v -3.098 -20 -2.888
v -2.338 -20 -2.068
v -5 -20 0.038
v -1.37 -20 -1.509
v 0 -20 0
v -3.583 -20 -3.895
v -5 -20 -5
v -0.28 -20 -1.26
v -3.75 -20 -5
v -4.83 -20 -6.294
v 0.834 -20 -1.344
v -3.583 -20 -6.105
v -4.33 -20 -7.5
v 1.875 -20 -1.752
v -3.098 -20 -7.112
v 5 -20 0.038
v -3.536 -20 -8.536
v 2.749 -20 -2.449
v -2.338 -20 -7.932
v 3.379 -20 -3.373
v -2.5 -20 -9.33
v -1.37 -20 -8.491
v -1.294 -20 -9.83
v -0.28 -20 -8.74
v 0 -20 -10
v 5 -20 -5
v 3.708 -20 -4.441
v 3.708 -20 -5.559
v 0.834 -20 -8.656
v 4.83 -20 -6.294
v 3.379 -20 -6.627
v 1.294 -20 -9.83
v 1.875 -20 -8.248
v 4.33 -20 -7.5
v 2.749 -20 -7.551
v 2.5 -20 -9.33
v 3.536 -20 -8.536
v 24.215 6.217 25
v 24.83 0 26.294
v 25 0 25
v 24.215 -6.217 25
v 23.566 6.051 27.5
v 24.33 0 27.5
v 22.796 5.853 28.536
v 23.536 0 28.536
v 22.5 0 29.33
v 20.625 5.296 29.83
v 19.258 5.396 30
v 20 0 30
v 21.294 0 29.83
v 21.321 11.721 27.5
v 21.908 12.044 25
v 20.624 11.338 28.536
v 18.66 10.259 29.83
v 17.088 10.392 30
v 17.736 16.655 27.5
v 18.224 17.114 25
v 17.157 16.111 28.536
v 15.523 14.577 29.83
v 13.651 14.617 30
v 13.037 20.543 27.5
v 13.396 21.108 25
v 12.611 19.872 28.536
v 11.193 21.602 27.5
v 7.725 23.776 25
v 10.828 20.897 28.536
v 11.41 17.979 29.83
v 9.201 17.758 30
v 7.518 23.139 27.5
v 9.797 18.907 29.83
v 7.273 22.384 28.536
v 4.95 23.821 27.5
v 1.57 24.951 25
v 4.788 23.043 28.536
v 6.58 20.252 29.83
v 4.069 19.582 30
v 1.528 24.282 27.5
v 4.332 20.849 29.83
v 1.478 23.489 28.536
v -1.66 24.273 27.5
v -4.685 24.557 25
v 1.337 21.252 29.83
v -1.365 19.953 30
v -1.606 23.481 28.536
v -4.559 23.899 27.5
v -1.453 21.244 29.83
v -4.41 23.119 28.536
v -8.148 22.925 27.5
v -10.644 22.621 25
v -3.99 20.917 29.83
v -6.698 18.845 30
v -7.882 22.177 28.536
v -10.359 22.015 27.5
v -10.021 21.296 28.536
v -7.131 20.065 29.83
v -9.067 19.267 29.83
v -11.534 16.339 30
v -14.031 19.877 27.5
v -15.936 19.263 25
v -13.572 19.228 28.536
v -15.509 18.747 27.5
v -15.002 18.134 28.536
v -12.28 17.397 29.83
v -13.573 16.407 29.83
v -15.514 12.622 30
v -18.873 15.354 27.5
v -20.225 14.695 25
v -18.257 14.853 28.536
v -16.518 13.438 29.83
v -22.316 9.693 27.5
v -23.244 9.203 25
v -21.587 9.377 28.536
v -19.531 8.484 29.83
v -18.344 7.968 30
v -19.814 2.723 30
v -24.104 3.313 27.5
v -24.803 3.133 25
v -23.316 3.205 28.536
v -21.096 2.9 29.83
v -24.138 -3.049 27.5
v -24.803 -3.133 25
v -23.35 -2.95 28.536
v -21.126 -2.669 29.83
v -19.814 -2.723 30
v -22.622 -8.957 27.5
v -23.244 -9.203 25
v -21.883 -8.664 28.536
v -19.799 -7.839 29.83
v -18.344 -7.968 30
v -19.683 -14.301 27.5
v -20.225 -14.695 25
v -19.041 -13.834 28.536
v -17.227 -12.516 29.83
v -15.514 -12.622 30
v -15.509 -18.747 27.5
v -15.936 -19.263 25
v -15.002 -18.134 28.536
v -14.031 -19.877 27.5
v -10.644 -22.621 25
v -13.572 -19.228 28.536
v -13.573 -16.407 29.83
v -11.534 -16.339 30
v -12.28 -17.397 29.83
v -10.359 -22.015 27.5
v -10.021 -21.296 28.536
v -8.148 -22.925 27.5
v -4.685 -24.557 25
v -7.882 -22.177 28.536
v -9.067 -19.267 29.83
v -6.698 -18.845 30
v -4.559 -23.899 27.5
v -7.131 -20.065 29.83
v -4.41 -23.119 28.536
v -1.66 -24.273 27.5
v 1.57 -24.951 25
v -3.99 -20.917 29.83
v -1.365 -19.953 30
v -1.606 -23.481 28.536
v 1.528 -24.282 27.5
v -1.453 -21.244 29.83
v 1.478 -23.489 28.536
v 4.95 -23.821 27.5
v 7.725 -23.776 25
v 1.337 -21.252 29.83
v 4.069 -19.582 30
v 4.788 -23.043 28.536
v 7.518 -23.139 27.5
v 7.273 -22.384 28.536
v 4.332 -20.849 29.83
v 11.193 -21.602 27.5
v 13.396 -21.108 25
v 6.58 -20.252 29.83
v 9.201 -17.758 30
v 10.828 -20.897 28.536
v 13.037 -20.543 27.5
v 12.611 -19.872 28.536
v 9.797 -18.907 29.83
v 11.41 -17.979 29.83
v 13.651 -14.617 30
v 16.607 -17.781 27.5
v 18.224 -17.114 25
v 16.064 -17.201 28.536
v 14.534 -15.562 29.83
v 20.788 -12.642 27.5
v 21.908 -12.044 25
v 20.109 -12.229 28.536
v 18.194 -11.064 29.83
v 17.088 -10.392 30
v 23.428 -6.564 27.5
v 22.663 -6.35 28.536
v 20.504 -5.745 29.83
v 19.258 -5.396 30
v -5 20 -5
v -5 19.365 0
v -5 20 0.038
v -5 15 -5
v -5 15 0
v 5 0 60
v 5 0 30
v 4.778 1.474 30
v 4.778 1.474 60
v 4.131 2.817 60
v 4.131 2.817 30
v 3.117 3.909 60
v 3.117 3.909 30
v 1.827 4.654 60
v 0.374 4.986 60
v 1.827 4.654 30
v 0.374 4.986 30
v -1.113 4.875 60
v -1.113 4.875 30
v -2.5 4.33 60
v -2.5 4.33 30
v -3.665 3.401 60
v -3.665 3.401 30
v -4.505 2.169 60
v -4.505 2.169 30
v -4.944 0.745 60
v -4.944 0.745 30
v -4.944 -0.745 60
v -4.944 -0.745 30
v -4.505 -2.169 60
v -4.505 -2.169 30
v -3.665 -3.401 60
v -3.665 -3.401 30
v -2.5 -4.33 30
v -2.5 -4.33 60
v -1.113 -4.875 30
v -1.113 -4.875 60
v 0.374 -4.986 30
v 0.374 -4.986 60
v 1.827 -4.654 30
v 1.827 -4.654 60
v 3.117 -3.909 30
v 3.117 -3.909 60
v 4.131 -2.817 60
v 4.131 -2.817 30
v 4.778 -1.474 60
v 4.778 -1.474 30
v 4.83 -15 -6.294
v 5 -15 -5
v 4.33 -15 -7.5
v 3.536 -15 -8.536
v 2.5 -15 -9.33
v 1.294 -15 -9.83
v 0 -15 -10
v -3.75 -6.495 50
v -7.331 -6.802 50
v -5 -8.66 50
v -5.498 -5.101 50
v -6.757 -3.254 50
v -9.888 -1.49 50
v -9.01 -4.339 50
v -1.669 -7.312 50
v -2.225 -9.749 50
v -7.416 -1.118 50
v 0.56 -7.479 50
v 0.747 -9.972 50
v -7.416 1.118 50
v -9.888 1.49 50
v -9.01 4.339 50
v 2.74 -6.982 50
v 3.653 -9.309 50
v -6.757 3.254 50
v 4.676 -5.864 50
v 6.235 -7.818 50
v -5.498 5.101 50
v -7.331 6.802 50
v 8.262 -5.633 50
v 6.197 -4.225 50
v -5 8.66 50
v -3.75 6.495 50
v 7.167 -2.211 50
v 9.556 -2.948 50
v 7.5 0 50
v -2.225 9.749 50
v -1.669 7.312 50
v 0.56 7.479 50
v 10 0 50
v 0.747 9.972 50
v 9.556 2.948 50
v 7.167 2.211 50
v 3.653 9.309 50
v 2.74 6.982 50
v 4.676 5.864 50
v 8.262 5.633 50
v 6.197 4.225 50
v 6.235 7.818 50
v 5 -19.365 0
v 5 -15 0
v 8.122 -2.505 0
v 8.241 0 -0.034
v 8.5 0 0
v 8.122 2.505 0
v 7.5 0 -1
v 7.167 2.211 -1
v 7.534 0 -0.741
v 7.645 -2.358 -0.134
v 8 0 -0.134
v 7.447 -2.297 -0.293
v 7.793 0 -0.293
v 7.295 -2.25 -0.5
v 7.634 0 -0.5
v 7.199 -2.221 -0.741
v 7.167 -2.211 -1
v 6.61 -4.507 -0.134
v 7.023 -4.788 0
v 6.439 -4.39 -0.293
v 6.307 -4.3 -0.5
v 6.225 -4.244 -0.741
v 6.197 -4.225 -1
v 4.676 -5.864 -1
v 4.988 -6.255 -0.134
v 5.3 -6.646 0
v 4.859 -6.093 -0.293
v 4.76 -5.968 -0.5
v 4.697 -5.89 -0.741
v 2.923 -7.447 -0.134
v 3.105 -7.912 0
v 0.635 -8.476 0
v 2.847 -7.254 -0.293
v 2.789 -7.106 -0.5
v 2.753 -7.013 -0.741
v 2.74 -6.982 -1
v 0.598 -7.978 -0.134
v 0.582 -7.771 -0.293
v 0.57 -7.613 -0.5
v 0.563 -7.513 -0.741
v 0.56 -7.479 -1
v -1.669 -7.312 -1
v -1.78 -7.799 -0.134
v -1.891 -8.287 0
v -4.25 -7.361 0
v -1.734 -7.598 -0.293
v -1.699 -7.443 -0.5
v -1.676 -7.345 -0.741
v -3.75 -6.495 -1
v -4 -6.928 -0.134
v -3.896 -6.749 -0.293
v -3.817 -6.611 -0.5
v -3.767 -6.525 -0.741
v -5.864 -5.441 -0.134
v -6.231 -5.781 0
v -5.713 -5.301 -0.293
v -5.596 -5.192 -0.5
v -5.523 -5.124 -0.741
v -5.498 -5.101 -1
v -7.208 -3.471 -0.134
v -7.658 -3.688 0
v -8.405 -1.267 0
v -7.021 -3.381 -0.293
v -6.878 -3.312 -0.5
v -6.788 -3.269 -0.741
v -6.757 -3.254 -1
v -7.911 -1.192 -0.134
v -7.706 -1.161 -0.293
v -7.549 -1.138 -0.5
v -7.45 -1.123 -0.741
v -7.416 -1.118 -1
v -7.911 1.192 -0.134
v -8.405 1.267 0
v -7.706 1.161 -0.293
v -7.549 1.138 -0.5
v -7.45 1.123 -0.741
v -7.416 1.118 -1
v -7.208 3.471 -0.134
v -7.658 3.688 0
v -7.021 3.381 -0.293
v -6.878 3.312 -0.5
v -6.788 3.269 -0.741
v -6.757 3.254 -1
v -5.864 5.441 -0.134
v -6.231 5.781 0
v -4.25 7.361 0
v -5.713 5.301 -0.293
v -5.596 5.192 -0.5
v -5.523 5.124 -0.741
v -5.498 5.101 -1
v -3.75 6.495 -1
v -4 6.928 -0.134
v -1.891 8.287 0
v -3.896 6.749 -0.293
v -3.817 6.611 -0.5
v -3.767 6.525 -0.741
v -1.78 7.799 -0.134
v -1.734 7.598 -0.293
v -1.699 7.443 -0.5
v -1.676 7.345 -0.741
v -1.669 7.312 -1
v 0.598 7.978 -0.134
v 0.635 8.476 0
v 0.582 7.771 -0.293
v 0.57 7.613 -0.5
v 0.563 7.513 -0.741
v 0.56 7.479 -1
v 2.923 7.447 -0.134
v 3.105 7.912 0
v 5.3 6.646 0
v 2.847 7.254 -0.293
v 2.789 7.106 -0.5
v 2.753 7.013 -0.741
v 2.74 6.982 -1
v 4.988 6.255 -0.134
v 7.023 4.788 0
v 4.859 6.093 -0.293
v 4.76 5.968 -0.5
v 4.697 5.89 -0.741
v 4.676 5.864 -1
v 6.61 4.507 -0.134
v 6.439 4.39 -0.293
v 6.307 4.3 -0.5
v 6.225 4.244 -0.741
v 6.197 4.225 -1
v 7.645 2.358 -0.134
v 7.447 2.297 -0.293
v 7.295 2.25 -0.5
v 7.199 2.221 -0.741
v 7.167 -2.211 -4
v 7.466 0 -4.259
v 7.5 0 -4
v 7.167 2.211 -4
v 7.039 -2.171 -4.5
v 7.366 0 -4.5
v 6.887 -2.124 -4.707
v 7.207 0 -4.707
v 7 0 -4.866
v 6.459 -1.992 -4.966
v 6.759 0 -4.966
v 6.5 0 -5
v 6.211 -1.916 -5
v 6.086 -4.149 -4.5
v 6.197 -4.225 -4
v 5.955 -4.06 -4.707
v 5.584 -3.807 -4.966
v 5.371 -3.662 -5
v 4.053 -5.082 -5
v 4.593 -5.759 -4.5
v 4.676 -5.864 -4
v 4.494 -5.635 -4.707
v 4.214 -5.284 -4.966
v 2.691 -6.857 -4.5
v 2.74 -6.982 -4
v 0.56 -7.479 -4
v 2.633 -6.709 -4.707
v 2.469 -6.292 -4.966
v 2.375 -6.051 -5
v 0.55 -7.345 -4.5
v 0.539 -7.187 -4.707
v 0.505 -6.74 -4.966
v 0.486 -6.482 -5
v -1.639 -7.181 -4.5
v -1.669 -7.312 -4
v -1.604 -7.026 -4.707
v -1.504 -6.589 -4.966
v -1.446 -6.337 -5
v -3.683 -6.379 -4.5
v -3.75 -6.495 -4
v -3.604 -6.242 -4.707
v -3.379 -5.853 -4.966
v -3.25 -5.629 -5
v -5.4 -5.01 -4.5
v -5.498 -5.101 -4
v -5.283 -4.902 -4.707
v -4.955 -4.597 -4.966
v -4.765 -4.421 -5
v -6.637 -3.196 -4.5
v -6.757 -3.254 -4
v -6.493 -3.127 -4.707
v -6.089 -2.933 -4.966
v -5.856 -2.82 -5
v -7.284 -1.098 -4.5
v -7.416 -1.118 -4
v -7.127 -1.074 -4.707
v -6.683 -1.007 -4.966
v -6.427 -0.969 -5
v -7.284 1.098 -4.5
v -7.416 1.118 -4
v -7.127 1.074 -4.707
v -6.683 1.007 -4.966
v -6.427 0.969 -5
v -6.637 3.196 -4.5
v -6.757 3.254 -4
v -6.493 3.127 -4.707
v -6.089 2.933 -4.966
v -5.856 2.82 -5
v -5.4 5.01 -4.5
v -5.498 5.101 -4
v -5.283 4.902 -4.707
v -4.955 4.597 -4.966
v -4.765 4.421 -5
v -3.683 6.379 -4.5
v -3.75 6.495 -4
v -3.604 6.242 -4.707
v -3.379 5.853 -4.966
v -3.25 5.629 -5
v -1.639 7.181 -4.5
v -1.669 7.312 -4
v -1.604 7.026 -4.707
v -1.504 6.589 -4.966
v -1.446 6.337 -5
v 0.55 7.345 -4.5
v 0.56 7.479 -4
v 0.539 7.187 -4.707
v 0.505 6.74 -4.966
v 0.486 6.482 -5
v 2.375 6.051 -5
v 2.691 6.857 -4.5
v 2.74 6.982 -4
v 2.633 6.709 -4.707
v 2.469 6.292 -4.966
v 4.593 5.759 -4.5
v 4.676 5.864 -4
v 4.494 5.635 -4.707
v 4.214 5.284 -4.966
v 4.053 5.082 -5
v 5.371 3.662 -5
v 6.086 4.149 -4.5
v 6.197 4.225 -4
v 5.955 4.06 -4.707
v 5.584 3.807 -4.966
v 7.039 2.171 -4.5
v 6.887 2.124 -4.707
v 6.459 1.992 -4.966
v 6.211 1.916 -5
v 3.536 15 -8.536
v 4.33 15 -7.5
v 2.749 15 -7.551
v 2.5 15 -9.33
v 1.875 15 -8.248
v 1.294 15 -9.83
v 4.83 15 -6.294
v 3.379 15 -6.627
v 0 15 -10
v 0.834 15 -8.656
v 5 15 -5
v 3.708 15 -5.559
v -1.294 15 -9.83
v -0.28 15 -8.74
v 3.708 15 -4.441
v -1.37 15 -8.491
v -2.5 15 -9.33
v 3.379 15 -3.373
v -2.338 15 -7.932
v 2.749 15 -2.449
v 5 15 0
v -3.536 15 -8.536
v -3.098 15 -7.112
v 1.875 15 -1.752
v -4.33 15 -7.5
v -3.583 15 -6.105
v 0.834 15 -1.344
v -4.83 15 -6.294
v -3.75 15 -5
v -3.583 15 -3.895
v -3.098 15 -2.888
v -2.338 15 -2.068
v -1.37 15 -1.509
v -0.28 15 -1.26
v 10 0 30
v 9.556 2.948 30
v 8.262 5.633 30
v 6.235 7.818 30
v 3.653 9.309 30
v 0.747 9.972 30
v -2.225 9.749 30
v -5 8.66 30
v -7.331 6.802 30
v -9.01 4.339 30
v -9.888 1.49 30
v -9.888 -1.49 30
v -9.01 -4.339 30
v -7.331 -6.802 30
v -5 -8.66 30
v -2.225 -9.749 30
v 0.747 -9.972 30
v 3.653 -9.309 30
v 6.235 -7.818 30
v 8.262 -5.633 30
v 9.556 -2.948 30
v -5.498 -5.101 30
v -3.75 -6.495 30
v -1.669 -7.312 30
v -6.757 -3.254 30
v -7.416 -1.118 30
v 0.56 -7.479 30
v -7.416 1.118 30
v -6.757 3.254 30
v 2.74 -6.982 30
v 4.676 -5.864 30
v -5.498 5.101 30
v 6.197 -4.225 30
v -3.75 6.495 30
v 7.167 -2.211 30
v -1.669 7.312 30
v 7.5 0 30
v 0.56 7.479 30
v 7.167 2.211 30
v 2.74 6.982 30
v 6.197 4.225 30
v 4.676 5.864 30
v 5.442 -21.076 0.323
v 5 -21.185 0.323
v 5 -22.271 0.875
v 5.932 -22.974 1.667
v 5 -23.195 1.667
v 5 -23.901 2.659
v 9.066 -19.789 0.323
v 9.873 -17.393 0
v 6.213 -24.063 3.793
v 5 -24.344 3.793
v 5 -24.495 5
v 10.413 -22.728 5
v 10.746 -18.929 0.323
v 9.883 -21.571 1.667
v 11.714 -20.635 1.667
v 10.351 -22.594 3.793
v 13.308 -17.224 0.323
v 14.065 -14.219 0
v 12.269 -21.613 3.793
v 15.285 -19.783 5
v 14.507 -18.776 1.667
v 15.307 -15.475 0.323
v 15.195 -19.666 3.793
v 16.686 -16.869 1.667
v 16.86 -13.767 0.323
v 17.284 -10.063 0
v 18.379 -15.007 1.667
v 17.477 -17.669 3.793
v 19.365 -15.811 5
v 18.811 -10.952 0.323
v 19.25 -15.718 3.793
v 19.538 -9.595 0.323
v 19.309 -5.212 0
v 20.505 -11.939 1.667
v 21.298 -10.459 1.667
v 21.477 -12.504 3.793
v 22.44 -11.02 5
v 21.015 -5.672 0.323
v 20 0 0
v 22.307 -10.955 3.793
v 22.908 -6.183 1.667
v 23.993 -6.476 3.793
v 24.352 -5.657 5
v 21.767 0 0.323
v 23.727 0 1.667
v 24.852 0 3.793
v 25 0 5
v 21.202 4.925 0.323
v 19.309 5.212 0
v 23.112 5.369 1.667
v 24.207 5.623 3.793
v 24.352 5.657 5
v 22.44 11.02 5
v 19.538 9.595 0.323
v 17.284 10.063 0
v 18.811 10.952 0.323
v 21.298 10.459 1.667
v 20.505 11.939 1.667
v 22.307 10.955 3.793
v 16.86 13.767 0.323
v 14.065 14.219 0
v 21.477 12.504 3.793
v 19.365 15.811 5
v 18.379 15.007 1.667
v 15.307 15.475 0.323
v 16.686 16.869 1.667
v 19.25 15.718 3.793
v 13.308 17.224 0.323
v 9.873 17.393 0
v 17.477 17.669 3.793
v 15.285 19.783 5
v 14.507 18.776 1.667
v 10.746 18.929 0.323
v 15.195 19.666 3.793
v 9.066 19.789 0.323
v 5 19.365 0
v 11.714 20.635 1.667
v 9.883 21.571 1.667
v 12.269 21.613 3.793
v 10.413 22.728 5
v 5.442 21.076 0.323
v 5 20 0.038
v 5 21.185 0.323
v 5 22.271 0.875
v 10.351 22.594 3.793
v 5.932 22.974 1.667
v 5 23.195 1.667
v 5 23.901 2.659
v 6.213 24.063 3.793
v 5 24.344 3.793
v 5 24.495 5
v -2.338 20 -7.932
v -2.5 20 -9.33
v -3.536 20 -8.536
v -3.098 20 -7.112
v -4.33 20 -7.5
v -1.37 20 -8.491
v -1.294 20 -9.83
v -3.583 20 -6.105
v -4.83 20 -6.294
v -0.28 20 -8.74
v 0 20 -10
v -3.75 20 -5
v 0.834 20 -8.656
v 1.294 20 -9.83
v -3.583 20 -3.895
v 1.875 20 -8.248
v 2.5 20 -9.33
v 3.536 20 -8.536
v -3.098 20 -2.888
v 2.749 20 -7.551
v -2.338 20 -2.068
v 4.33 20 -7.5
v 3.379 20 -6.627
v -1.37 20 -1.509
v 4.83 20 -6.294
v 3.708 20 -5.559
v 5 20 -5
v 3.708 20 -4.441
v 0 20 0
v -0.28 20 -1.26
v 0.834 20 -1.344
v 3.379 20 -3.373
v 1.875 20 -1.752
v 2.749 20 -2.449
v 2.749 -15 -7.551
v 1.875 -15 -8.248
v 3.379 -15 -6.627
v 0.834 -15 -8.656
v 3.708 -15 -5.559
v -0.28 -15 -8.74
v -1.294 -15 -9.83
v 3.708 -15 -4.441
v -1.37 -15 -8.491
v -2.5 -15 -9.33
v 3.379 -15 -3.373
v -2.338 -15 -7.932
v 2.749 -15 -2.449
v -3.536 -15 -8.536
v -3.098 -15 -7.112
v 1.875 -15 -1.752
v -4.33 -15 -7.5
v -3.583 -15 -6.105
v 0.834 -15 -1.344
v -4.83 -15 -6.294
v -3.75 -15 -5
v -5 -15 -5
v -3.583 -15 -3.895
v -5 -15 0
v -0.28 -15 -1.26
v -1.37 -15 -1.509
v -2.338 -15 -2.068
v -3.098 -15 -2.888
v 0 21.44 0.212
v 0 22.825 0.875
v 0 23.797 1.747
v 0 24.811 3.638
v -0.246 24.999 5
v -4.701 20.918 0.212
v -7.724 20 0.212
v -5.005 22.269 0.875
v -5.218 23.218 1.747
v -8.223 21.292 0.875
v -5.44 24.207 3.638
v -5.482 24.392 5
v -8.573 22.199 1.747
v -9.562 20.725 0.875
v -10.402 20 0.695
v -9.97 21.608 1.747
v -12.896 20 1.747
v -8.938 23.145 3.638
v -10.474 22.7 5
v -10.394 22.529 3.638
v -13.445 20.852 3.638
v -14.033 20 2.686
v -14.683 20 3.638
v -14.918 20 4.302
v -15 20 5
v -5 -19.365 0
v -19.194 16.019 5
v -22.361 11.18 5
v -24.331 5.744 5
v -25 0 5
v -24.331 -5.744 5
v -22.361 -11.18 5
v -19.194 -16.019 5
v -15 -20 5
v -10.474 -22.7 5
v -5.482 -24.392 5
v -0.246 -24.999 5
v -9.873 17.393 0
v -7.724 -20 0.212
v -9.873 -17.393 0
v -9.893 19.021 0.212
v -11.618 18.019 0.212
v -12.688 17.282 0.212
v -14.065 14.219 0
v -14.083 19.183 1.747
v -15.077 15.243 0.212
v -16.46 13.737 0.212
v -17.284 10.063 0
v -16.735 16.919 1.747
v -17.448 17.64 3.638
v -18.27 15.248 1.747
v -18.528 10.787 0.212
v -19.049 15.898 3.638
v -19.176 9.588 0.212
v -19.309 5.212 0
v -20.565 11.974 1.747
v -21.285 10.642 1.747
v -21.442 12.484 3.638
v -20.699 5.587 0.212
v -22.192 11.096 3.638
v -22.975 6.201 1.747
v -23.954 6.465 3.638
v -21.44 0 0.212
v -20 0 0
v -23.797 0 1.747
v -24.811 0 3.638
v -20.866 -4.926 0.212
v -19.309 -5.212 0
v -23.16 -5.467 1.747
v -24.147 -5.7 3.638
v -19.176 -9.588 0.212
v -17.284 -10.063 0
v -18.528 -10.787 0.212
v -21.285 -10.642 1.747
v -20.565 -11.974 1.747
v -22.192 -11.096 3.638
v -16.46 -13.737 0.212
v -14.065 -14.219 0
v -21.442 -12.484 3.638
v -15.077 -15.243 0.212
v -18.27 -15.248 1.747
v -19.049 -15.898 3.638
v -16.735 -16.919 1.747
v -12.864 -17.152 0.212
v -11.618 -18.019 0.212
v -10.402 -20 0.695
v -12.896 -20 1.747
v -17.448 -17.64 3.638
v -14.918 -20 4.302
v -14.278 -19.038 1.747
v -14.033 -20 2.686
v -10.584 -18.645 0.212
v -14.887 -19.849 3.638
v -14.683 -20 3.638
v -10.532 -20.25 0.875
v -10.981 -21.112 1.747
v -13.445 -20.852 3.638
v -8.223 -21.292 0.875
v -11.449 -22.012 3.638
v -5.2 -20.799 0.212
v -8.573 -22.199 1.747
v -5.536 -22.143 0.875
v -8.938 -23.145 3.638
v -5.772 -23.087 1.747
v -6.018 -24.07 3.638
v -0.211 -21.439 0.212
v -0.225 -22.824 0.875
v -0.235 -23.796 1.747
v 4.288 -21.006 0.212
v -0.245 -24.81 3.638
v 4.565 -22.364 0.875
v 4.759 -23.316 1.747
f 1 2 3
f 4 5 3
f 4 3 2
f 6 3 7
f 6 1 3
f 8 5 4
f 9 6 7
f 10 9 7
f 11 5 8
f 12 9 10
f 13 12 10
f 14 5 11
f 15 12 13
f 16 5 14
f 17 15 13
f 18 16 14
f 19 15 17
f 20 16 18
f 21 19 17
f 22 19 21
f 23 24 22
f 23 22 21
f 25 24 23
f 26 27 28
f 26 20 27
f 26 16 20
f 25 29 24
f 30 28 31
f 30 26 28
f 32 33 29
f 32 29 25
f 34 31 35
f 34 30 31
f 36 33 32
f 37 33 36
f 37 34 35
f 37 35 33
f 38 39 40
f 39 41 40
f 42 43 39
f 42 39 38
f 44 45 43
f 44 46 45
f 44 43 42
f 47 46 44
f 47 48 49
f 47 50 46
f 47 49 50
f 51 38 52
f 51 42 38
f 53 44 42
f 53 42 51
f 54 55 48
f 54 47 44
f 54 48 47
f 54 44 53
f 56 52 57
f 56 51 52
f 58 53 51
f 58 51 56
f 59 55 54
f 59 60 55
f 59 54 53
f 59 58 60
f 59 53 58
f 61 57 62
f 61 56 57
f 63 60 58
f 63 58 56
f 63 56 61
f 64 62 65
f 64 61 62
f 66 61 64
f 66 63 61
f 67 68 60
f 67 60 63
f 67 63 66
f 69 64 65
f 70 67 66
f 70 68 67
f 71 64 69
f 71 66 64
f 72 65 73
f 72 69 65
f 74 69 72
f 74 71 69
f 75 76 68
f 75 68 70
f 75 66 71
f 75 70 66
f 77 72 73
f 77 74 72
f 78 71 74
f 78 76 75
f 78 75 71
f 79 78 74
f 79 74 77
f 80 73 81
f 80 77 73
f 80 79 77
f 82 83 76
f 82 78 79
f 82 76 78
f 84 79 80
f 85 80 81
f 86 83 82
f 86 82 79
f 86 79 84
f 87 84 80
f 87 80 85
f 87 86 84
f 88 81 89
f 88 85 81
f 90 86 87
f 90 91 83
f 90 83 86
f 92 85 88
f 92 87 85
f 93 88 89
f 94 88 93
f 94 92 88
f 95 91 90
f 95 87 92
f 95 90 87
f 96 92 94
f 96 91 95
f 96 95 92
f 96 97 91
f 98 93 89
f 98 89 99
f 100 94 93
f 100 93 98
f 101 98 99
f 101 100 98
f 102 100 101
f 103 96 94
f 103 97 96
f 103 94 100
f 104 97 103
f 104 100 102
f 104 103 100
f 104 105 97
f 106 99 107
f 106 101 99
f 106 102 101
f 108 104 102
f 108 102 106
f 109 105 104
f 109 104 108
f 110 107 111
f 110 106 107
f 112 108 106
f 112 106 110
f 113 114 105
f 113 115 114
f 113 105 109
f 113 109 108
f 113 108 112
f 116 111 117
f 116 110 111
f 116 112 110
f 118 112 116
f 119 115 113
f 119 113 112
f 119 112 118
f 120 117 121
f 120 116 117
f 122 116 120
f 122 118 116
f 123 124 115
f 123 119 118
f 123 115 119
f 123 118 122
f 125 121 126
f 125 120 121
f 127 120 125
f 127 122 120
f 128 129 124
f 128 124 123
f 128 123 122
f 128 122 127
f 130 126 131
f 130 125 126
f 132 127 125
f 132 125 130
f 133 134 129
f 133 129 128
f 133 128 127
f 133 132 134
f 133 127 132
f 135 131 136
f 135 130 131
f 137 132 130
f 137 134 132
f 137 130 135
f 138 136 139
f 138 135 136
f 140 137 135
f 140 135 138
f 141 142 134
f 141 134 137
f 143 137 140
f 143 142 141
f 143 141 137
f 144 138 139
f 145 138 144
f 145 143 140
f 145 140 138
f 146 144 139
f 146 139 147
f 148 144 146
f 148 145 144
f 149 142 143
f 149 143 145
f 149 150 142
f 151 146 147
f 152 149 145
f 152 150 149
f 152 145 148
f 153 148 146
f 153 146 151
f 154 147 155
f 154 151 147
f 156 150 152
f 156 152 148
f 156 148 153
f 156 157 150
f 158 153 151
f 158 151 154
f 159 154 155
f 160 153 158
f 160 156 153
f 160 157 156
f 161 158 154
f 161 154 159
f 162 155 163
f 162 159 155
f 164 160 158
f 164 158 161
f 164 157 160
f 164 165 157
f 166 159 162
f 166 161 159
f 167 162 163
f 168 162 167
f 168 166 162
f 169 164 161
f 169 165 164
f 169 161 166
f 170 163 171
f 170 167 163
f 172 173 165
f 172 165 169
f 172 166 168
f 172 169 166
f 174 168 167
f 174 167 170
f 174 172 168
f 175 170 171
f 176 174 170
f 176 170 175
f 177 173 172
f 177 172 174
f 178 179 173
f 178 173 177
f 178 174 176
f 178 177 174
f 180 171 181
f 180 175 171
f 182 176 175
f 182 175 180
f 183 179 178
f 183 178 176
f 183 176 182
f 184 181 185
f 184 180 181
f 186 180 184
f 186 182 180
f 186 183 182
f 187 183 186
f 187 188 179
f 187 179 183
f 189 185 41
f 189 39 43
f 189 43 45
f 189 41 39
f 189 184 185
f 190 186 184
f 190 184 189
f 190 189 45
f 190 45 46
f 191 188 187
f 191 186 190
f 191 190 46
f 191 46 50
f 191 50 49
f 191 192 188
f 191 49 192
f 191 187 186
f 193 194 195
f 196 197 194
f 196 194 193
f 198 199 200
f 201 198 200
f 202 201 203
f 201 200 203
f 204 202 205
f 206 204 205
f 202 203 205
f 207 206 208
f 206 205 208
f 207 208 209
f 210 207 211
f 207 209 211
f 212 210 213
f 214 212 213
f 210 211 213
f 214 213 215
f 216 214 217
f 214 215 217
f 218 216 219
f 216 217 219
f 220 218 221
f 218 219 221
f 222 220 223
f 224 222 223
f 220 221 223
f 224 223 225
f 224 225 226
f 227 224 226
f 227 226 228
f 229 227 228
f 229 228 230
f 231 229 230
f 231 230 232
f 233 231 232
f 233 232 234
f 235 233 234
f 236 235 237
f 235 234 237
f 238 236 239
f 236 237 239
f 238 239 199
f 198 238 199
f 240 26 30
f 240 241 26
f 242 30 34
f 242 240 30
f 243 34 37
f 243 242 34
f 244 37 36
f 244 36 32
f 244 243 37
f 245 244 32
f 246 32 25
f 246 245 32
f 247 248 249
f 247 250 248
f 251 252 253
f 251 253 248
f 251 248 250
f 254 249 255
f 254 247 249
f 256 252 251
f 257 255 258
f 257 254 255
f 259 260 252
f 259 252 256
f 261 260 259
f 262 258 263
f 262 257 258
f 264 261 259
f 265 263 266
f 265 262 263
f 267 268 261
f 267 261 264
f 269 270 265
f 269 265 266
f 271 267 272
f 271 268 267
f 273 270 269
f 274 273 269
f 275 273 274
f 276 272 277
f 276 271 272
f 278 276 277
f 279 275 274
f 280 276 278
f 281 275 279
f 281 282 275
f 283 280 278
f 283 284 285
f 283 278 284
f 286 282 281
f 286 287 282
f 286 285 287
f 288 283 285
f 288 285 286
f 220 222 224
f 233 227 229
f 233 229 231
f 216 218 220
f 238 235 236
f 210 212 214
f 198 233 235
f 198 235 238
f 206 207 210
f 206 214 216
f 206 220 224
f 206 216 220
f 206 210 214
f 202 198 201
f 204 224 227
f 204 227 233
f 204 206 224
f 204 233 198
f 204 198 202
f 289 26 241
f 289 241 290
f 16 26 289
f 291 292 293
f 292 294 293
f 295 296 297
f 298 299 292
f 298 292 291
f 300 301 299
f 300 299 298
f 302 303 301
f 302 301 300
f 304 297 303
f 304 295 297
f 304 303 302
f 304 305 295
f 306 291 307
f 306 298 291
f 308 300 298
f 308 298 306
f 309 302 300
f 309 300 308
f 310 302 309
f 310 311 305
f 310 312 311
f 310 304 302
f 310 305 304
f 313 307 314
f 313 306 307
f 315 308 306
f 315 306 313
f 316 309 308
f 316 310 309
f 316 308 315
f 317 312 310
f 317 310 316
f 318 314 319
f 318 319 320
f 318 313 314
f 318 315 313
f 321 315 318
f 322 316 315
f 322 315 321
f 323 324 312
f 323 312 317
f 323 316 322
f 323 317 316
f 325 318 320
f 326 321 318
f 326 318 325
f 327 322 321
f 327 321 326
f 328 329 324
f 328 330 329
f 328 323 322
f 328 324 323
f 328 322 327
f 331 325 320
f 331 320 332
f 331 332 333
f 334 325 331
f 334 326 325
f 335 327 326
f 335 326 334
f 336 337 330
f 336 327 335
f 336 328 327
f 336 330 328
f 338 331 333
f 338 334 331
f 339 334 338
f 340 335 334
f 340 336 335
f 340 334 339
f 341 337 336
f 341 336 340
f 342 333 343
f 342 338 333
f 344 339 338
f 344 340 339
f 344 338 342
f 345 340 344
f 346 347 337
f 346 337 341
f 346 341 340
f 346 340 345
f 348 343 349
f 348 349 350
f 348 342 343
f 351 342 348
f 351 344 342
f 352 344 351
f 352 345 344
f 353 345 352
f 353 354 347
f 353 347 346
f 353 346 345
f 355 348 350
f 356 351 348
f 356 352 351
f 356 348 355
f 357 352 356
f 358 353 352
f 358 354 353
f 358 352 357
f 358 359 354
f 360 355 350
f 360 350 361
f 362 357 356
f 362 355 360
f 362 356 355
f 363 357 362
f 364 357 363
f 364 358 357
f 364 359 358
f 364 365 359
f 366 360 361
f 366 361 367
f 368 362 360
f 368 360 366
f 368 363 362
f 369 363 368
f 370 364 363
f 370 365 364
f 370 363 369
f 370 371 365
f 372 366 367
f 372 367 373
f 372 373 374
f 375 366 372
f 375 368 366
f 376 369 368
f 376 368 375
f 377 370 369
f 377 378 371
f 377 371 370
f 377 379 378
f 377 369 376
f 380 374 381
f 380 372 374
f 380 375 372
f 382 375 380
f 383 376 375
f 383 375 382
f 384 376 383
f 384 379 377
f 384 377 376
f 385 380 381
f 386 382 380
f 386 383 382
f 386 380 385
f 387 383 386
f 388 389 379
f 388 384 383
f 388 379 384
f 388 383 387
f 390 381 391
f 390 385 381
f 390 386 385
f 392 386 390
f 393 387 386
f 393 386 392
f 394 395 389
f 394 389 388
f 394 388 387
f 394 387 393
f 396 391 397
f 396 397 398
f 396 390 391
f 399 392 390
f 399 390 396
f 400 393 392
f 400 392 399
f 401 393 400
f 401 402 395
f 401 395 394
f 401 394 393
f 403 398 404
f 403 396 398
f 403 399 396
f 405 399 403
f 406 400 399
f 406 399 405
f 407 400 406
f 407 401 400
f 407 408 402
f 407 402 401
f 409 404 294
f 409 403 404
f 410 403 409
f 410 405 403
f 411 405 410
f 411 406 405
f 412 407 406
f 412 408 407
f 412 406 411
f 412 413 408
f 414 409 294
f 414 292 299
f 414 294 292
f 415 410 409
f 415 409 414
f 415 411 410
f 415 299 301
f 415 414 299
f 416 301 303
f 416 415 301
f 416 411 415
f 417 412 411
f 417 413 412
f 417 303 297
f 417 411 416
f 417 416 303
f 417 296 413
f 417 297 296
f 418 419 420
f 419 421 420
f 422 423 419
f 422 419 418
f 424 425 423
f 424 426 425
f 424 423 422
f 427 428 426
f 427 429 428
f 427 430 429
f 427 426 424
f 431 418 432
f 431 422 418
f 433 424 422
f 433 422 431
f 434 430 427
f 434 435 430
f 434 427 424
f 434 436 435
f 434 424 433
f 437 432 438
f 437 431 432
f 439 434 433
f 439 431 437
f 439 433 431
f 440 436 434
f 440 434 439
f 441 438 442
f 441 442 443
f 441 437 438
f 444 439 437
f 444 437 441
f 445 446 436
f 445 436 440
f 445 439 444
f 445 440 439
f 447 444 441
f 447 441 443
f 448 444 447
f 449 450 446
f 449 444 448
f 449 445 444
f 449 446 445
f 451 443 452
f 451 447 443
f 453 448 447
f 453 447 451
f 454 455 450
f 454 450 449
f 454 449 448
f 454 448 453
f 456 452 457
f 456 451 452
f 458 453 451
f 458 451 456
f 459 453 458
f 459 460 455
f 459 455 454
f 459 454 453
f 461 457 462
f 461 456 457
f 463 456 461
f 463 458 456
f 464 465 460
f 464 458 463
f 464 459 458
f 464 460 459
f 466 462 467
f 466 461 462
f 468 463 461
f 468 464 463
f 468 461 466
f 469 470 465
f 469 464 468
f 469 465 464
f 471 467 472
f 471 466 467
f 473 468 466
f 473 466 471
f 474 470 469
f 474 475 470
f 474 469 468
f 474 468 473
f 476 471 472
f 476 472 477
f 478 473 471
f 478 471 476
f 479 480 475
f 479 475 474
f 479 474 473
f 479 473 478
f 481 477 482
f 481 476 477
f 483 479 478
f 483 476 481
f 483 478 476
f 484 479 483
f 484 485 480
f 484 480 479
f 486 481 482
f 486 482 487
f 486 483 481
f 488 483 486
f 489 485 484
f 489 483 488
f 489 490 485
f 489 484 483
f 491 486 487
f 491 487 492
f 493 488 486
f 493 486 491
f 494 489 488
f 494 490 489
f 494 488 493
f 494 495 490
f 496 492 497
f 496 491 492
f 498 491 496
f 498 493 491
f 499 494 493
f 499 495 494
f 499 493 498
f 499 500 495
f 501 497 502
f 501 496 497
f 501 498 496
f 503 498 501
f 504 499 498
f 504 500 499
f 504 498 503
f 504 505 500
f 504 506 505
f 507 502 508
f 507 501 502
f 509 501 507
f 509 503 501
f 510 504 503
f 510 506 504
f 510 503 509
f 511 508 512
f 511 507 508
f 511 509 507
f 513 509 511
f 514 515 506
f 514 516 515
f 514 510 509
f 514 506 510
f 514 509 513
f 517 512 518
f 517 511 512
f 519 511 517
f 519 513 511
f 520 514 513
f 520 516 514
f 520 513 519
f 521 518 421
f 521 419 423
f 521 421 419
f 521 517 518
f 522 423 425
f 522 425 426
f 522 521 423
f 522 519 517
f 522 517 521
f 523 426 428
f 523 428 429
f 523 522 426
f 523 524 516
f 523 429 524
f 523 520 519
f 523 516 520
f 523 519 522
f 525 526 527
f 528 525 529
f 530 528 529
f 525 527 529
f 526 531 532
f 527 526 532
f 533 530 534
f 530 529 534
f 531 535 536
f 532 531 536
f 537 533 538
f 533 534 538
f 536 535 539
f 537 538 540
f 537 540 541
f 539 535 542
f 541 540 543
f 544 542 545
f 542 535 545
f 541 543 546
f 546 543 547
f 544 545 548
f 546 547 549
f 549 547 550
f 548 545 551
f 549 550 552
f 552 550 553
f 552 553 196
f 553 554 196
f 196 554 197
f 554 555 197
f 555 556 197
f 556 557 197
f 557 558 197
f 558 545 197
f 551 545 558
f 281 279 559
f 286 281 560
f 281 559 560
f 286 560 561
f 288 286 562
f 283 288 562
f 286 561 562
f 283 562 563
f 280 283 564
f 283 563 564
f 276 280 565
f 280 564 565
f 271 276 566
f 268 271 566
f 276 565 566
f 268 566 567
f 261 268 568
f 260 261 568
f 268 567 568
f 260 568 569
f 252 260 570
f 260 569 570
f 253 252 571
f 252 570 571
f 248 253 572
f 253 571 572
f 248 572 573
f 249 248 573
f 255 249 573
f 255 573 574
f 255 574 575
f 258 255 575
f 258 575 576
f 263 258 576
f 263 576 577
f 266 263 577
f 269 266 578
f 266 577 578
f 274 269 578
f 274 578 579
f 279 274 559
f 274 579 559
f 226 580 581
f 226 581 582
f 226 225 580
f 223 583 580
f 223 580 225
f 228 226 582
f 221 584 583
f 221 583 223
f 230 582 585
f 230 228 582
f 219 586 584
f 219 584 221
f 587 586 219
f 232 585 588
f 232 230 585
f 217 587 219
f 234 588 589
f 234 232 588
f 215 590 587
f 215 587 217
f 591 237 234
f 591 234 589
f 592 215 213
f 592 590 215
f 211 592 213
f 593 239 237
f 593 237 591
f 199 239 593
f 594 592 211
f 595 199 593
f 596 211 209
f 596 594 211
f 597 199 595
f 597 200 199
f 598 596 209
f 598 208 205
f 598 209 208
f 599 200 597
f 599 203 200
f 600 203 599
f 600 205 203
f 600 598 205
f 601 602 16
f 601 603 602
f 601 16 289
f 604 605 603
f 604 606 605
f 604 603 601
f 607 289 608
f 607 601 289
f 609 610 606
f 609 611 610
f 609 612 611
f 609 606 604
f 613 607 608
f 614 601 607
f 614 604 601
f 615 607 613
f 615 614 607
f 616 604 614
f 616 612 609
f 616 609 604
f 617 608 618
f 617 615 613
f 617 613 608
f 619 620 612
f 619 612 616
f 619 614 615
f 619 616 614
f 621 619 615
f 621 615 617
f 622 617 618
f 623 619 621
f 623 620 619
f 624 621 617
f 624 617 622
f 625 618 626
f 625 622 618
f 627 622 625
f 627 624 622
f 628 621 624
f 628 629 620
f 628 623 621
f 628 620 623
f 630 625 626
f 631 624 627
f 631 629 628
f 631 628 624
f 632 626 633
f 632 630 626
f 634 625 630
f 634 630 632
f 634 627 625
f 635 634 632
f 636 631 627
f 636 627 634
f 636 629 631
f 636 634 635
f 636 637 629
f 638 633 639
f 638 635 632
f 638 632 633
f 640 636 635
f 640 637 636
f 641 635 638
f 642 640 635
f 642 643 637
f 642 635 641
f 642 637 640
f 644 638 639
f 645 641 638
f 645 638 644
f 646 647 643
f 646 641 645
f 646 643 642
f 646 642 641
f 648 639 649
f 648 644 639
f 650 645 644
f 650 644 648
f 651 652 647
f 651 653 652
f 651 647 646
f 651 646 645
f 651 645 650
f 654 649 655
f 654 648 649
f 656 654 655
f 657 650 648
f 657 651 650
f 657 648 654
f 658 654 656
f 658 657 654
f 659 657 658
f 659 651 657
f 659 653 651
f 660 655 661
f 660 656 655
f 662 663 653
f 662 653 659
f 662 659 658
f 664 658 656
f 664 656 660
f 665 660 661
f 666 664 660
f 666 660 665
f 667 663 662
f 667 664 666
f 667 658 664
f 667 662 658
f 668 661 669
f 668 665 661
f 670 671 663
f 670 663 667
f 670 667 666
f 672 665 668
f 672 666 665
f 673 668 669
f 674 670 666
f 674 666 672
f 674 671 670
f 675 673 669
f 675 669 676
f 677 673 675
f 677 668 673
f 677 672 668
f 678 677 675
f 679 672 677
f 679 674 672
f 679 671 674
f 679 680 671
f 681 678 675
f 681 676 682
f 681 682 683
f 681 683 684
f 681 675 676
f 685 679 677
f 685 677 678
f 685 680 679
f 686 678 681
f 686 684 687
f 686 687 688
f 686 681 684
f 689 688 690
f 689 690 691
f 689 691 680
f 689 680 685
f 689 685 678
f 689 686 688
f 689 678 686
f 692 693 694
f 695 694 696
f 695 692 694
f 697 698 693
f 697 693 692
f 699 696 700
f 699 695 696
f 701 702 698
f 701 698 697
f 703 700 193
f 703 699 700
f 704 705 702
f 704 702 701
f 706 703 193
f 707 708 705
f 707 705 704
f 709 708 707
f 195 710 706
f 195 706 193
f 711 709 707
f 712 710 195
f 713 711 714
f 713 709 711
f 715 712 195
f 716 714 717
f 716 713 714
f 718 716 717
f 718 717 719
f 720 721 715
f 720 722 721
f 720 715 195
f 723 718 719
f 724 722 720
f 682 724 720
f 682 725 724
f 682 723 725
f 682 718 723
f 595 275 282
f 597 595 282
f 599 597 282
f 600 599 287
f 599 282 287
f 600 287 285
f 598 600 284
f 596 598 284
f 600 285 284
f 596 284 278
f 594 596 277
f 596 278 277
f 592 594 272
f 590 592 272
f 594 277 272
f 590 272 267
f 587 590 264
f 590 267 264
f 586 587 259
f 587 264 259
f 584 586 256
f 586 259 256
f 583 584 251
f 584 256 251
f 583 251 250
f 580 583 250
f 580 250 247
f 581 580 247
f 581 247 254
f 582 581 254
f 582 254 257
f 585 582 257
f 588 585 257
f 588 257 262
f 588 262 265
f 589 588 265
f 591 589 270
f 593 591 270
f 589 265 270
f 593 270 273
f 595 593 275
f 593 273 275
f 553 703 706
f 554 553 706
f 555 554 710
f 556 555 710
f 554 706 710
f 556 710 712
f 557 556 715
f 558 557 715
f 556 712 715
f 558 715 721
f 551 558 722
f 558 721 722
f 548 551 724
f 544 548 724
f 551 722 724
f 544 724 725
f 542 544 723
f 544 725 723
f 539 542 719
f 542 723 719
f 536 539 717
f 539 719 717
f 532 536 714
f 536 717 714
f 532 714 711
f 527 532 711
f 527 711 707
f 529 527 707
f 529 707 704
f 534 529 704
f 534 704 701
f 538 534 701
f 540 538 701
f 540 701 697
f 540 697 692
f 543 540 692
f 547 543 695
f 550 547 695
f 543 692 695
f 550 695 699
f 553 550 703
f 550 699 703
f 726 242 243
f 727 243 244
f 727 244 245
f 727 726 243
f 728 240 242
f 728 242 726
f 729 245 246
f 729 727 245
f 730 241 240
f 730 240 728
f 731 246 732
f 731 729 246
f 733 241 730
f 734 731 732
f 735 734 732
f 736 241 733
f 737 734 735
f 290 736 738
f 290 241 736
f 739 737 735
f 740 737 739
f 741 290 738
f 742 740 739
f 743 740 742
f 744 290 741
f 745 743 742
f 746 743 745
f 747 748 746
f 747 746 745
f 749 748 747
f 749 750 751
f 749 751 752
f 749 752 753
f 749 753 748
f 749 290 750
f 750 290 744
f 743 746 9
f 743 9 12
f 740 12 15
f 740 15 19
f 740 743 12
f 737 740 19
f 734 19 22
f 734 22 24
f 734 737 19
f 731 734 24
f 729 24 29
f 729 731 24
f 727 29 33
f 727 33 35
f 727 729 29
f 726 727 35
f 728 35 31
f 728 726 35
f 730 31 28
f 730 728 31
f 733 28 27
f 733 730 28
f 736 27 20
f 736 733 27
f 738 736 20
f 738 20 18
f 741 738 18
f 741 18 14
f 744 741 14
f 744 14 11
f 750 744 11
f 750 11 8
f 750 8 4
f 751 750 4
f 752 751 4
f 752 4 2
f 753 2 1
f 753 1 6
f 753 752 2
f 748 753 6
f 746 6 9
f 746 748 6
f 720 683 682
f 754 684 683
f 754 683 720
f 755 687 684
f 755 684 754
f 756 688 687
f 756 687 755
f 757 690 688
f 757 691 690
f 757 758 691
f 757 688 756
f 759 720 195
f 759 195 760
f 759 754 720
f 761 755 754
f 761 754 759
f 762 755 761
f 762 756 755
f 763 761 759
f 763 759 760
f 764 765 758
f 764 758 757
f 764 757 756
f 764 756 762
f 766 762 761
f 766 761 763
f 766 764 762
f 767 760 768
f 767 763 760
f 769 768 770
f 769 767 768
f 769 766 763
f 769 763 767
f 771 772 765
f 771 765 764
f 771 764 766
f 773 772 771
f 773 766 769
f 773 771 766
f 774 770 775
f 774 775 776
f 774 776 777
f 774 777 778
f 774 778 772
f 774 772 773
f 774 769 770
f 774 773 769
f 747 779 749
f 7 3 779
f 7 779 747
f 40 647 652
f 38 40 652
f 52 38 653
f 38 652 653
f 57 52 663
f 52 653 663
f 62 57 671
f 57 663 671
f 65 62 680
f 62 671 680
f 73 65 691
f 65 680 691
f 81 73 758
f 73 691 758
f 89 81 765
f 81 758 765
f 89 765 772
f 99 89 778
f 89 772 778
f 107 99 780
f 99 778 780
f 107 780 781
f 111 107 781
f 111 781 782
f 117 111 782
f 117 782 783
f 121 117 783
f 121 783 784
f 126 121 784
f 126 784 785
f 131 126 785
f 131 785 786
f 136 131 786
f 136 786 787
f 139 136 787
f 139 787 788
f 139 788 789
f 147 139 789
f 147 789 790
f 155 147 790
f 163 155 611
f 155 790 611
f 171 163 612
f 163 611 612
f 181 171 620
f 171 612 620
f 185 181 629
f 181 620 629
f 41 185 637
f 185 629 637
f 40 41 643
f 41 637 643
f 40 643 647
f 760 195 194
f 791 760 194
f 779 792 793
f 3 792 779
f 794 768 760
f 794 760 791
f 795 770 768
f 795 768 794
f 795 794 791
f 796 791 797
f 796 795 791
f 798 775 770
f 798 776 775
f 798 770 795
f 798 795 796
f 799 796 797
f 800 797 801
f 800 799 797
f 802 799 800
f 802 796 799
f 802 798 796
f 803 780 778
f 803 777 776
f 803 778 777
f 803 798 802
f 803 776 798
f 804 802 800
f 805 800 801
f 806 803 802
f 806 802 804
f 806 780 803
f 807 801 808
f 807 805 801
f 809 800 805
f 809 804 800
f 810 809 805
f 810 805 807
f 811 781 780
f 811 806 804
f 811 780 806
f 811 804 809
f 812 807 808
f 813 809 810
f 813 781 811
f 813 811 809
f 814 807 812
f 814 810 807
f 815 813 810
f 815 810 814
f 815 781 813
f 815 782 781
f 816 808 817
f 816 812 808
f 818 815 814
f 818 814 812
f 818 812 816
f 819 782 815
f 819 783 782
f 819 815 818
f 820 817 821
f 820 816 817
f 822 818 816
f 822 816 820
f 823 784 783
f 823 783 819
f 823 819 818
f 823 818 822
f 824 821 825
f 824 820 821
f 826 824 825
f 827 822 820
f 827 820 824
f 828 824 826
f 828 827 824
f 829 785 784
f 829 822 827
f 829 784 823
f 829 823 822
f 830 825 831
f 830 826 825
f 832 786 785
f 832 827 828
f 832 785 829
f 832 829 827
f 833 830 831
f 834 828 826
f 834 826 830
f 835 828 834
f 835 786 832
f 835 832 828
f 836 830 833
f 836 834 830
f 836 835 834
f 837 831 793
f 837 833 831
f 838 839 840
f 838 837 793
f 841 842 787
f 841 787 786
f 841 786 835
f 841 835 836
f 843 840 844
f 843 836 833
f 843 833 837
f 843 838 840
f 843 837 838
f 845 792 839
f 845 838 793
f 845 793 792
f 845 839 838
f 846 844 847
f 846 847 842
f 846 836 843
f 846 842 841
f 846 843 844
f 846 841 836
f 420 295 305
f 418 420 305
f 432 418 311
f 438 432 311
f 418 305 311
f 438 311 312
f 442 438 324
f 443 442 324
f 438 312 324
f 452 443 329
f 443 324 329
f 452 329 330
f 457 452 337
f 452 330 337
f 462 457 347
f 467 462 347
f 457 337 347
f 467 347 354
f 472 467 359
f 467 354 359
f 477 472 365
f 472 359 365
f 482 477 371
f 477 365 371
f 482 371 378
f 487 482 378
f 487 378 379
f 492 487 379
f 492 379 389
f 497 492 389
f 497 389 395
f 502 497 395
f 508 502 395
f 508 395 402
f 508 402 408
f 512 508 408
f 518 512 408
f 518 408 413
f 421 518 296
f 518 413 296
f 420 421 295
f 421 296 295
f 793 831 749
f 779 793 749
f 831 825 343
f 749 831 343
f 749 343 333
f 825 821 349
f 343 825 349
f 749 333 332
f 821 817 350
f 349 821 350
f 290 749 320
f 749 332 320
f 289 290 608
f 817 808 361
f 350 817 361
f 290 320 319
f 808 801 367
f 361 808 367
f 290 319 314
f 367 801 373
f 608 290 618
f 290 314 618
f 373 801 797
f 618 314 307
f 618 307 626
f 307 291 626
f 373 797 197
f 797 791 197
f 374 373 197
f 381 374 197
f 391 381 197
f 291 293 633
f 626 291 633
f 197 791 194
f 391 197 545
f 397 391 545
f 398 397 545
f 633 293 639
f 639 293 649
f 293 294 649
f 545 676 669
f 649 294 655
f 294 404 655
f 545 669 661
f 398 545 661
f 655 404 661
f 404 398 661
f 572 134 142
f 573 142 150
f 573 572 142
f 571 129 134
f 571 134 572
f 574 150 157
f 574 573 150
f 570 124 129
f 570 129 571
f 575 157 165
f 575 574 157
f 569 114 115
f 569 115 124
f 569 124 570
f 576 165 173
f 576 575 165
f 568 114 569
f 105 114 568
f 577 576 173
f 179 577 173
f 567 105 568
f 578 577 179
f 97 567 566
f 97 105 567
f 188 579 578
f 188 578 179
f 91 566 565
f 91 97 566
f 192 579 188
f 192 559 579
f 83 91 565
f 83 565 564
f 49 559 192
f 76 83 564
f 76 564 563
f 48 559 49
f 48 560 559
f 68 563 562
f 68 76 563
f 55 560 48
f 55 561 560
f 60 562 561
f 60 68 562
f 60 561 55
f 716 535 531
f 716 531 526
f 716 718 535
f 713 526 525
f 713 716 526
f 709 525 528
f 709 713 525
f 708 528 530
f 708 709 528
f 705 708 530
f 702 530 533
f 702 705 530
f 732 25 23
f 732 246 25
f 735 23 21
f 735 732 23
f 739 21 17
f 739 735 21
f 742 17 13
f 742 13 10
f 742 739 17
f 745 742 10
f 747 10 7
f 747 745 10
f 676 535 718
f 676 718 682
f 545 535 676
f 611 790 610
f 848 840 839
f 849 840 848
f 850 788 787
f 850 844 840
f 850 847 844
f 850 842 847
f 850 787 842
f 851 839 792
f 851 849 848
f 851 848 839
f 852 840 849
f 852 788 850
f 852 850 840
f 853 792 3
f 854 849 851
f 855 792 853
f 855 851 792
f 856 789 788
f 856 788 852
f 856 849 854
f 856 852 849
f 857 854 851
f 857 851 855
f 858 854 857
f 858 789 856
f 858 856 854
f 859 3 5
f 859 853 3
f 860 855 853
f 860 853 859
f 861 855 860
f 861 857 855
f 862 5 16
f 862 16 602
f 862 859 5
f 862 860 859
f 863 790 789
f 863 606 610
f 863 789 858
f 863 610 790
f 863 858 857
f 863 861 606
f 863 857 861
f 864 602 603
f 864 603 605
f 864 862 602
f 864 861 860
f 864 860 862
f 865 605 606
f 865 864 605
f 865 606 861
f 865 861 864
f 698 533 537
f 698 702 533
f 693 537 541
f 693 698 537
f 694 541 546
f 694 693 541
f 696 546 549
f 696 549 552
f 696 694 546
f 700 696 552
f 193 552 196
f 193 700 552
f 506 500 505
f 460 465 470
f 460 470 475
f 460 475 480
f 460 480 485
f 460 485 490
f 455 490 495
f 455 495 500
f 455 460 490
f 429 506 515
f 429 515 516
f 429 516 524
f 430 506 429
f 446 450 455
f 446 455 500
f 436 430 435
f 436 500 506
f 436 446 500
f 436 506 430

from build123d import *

# Parameters (mm, degrees)
SKETCH1_R           = 25
BOSS_EXTRUDE1_DEPTH = 30
SKETCH2_R           = 10
BOSS_EXTRUDE2_DEPTH = 20
SKETCH3_R           = 7.5
CUT_EXTRUDE1_DEPTH  = 20
SKETCH4_R           = 5
BOSS_EXTRUDE3_DEPTH = 30
SKETCH5_R           = 7.5
BOSS_EXTRUDE4_DEPTH = 5
SKETCH7_W           = 10
SKETCH7_H           = 5
BOSS_EXTRUDE5_DEPTH = 10
SKETCH8_R           = 3.75
CUT_EXTRUDE2_DEPTH  = 5
CUT_EXTRUDE3_START  = -5
SKETCH9_R           = 3.75
CUT_EXTRUDE3_DEPTH  = 5
FILLET1_R           = 5
FILLET2_R           = 5
FILLET3_R           = 1


# Some blends are built 0.0001 mm under size
with BuildPart() as part:
    # Sketch1 → Boss-Extrude1 (new body)
    with BuildSketch(Plane.XY):
        Circle(SKETCH1_R)
    extrude(amount=BOSS_EXTRUDE1_DEPTH)

    # Sketch2 → Boss-Extrude2 (add)
    with BuildSketch(Plane.XY.offset(30)):
        Circle(SKETCH2_R)
    extrude(amount=BOSS_EXTRUDE2_DEPTH)

    # Sketch3 → Cut-Extrude1 (cut)
    with BuildSketch(Plane.XY.offset(50)):
        Circle(SKETCH3_R)
    extrude(amount=-CUT_EXTRUDE1_DEPTH, mode=Mode.SUBTRACT)

    # Sketch4 → Boss-Extrude3 (add)
    with BuildSketch(Plane.XY.offset(30)):
        Circle(SKETCH4_R)
    extrude(amount=BOSS_EXTRUDE3_DEPTH)

    # Sketch5 → Boss-Extrude4 (add)
    with BuildSketch(Plane(origin=(0, 0, 0), x_dir=(-1, 0, 0), z_dir=(0, 0, -1))):
        with Locations(Location((0, 0, 0), (0, 0, 180))):
            Circle(SKETCH5_R)
    extrude(amount=BOSS_EXTRUDE4_DEPTH)

    # Sketch7 → Boss-Extrude5 (add)
    with BuildSketch(Plane(origin=(0, 0, 0), x_dir=(-1, 0, 0), z_dir=(0, 0, -1))):
        with Locations((0, 17.5)):
            Rectangle(SKETCH7_W, SKETCH7_H)
        with Locations((0, -17.5)):
            Rectangle(SKETCH7_W, SKETCH7_H)
    extrude(amount=BOSS_EXTRUDE5_DEPTH)

    # Sketch8 → Cut-Extrude2 (cut)
    with BuildSketch(Plane(origin=(0, 20, 0), x_dir=(1, 0, 0), z_dir=(0, 1, 0))):
        with Locations(Location((0, 5, 0), (0, 0, 180))):
            Circle(SKETCH8_R)
    extrude(amount=-CUT_EXTRUDE2_DEPTH, mode=Mode.SUBTRACT)

    # Sketch9 → Cut-Extrude3 (cut)
    with BuildSketch(Plane(origin=(0, -20, 0), x_dir=(-1, 0, 0), z_dir=(0, -1, 0)).offset(CUT_EXTRUDE3_START)):
        with Locations((0, 5)):
            Circle(SKETCH9_R)
    extrude(amount=CUT_EXTRUDE3_DEPTH, mode=Mode.SUBTRACT)

    # Fillet1
    # the kernel refuses this fillet: 5 mm, written as the material it takes off along each edge
    with BuildSketch(Plane(origin=(0, 0, 30), x_dir=(1, 0, 0), z_dir=(0, -1, 0))) as fillet1_piece_1:
        with BuildLine():
            CenterArc((25 - FILLET1_R, -FILLET1_R), FILLET1_R, 0, 90)
            Line((25 - FILLET1_R, 0), (25, 0))
            Line((25, 0), (25, -FILLET1_R))
        make_face()
    revolve(axis=Axis((0, 0, 30), (0, 0, 1)), mode=Mode.SUBTRACT)
    with BuildSketch(Plane(origin=(0, 0, 0), x_dir=(1, 0, 0), z_dir=(0, -1, 0))) as fillet1_piece_2_section:
        with BuildLine():
            CenterArc((25 - FILLET1_R, FILLET1_R), FILLET1_R, 270, 90)
            Line((25 - FILLET1_R, 0), (25, 0))
            Line((25, 0), (25, FILLET1_R))
        make_face()
    fillet1_piece_2 = revolve(axis=Axis((0, 0, 0), (0, 0, 1)), mode=Mode.PRIVATE)
    fillet1_piece_2 = split(fillet1_piece_2, bisect_by=Plane(origin=(5, 14.511659558, 1.419610571), z_dir=(1, 0, 0)), keep=Keep.TOP, mode=Mode.PRIVATE)
    add(fillet1_piece_2, mode=Mode.SUBTRACT)
    with BuildSketch(Plane(origin=(0, 0, 0), x_dir=(1, 0, 0), z_dir=(0, -1, 0))) as fillet1_piece_3_section:
        with BuildLine():
            CenterArc((25 - FILLET1_R, FILLET1_R), FILLET1_R, 270, 90)
            Line((25 - FILLET1_R, 0), (25, 0))
            Line((25, 0), (25, FILLET1_R))
        make_face()
    fillet1_piece_3 = revolve(axis=Axis((0, 0, 0), (0, 0, 1)), mode=Mode.PRIVATE)
    fillet1_piece_3 = split(fillet1_piece_3, bisect_by=Plane(origin=(4.6e-08, 20, 1.116734198), z_dir=(0, 1, 0)), keep=Keep.TOP, mode=Mode.PRIVATE)
    add(fillet1_piece_3, mode=Mode.SUBTRACT)
    with BuildSketch(Plane(origin=(0, 0, 0), x_dir=(1, 0, 0), z_dir=(0, -1, 0))) as fillet1_piece_4_section:
        with BuildLine():
            CenterArc((25 - FILLET1_R, FILLET1_R), FILLET1_R, 270, 90)
            Line((25 - FILLET1_R, 0), (25, 0))
            Line((25, 0), (25, FILLET1_R))
        make_face()
    fillet1_piece_4 = revolve(axis=Axis((0, 0, 0), (0, 0, 1)), mode=Mode.PRIVATE)
    fillet1_piece_4 = split(fillet1_piece_4, bisect_by=Plane(origin=(-4.6e-08, -20, 1.116734198), z_dir=(0, -1, 0)), keep=Keep.TOP, mode=Mode.PRIVATE)
    add(fillet1_piece_4, mode=Mode.SUBTRACT)
    with BuildSketch(Plane(origin=(0, 0, 0), x_dir=(1, 0, 0), z_dir=(0, -1, 0))) as fillet1_piece_5_section:
        with BuildLine():
            CenterArc((25 - FILLET1_R, FILLET1_R), FILLET1_R, 270, 90)
            Line((25 - FILLET1_R, 0), (25, 0))
            Line((25, 0), (25, FILLET1_R))
        make_face()
    fillet1_piece_5 = revolve(axis=Axis((0, 0, 0), (0, 0, 1)), mode=Mode.PRIVATE)
    fillet1_piece_5 = split(fillet1_piece_5, bisect_by=Plane(origin=(-5, 0, 1.419610538), z_dir=(-1, 0, 0)), keep=Keep.TOP, mode=Mode.PRIVATE)
    add(fillet1_piece_5, mode=Mode.SUBTRACT)

    # Fillet2
    fillet2_edges = [part.edges().sort_by_distance(p)[0] for p in [
        (5, -17.5, -10),
        (-5, -17.5, -10),
        (5, 17.5, -10),
        (-5, 17.5, -10),
    ]]
    fillet(fillet2_edges, radius=FILLET2_R - 0.0001)  # a hair under: the kernel refuses the full size

    # Fillet3
    fillet3_edges = [part.edges().sort_by_distance(p)[0] for p in [
        (-7.5, 0, 0),
        (-7.5, 0, -5),
    ]]
    fillet(fillet3_edges, radius=FILLET3_R)


solid = part.part
